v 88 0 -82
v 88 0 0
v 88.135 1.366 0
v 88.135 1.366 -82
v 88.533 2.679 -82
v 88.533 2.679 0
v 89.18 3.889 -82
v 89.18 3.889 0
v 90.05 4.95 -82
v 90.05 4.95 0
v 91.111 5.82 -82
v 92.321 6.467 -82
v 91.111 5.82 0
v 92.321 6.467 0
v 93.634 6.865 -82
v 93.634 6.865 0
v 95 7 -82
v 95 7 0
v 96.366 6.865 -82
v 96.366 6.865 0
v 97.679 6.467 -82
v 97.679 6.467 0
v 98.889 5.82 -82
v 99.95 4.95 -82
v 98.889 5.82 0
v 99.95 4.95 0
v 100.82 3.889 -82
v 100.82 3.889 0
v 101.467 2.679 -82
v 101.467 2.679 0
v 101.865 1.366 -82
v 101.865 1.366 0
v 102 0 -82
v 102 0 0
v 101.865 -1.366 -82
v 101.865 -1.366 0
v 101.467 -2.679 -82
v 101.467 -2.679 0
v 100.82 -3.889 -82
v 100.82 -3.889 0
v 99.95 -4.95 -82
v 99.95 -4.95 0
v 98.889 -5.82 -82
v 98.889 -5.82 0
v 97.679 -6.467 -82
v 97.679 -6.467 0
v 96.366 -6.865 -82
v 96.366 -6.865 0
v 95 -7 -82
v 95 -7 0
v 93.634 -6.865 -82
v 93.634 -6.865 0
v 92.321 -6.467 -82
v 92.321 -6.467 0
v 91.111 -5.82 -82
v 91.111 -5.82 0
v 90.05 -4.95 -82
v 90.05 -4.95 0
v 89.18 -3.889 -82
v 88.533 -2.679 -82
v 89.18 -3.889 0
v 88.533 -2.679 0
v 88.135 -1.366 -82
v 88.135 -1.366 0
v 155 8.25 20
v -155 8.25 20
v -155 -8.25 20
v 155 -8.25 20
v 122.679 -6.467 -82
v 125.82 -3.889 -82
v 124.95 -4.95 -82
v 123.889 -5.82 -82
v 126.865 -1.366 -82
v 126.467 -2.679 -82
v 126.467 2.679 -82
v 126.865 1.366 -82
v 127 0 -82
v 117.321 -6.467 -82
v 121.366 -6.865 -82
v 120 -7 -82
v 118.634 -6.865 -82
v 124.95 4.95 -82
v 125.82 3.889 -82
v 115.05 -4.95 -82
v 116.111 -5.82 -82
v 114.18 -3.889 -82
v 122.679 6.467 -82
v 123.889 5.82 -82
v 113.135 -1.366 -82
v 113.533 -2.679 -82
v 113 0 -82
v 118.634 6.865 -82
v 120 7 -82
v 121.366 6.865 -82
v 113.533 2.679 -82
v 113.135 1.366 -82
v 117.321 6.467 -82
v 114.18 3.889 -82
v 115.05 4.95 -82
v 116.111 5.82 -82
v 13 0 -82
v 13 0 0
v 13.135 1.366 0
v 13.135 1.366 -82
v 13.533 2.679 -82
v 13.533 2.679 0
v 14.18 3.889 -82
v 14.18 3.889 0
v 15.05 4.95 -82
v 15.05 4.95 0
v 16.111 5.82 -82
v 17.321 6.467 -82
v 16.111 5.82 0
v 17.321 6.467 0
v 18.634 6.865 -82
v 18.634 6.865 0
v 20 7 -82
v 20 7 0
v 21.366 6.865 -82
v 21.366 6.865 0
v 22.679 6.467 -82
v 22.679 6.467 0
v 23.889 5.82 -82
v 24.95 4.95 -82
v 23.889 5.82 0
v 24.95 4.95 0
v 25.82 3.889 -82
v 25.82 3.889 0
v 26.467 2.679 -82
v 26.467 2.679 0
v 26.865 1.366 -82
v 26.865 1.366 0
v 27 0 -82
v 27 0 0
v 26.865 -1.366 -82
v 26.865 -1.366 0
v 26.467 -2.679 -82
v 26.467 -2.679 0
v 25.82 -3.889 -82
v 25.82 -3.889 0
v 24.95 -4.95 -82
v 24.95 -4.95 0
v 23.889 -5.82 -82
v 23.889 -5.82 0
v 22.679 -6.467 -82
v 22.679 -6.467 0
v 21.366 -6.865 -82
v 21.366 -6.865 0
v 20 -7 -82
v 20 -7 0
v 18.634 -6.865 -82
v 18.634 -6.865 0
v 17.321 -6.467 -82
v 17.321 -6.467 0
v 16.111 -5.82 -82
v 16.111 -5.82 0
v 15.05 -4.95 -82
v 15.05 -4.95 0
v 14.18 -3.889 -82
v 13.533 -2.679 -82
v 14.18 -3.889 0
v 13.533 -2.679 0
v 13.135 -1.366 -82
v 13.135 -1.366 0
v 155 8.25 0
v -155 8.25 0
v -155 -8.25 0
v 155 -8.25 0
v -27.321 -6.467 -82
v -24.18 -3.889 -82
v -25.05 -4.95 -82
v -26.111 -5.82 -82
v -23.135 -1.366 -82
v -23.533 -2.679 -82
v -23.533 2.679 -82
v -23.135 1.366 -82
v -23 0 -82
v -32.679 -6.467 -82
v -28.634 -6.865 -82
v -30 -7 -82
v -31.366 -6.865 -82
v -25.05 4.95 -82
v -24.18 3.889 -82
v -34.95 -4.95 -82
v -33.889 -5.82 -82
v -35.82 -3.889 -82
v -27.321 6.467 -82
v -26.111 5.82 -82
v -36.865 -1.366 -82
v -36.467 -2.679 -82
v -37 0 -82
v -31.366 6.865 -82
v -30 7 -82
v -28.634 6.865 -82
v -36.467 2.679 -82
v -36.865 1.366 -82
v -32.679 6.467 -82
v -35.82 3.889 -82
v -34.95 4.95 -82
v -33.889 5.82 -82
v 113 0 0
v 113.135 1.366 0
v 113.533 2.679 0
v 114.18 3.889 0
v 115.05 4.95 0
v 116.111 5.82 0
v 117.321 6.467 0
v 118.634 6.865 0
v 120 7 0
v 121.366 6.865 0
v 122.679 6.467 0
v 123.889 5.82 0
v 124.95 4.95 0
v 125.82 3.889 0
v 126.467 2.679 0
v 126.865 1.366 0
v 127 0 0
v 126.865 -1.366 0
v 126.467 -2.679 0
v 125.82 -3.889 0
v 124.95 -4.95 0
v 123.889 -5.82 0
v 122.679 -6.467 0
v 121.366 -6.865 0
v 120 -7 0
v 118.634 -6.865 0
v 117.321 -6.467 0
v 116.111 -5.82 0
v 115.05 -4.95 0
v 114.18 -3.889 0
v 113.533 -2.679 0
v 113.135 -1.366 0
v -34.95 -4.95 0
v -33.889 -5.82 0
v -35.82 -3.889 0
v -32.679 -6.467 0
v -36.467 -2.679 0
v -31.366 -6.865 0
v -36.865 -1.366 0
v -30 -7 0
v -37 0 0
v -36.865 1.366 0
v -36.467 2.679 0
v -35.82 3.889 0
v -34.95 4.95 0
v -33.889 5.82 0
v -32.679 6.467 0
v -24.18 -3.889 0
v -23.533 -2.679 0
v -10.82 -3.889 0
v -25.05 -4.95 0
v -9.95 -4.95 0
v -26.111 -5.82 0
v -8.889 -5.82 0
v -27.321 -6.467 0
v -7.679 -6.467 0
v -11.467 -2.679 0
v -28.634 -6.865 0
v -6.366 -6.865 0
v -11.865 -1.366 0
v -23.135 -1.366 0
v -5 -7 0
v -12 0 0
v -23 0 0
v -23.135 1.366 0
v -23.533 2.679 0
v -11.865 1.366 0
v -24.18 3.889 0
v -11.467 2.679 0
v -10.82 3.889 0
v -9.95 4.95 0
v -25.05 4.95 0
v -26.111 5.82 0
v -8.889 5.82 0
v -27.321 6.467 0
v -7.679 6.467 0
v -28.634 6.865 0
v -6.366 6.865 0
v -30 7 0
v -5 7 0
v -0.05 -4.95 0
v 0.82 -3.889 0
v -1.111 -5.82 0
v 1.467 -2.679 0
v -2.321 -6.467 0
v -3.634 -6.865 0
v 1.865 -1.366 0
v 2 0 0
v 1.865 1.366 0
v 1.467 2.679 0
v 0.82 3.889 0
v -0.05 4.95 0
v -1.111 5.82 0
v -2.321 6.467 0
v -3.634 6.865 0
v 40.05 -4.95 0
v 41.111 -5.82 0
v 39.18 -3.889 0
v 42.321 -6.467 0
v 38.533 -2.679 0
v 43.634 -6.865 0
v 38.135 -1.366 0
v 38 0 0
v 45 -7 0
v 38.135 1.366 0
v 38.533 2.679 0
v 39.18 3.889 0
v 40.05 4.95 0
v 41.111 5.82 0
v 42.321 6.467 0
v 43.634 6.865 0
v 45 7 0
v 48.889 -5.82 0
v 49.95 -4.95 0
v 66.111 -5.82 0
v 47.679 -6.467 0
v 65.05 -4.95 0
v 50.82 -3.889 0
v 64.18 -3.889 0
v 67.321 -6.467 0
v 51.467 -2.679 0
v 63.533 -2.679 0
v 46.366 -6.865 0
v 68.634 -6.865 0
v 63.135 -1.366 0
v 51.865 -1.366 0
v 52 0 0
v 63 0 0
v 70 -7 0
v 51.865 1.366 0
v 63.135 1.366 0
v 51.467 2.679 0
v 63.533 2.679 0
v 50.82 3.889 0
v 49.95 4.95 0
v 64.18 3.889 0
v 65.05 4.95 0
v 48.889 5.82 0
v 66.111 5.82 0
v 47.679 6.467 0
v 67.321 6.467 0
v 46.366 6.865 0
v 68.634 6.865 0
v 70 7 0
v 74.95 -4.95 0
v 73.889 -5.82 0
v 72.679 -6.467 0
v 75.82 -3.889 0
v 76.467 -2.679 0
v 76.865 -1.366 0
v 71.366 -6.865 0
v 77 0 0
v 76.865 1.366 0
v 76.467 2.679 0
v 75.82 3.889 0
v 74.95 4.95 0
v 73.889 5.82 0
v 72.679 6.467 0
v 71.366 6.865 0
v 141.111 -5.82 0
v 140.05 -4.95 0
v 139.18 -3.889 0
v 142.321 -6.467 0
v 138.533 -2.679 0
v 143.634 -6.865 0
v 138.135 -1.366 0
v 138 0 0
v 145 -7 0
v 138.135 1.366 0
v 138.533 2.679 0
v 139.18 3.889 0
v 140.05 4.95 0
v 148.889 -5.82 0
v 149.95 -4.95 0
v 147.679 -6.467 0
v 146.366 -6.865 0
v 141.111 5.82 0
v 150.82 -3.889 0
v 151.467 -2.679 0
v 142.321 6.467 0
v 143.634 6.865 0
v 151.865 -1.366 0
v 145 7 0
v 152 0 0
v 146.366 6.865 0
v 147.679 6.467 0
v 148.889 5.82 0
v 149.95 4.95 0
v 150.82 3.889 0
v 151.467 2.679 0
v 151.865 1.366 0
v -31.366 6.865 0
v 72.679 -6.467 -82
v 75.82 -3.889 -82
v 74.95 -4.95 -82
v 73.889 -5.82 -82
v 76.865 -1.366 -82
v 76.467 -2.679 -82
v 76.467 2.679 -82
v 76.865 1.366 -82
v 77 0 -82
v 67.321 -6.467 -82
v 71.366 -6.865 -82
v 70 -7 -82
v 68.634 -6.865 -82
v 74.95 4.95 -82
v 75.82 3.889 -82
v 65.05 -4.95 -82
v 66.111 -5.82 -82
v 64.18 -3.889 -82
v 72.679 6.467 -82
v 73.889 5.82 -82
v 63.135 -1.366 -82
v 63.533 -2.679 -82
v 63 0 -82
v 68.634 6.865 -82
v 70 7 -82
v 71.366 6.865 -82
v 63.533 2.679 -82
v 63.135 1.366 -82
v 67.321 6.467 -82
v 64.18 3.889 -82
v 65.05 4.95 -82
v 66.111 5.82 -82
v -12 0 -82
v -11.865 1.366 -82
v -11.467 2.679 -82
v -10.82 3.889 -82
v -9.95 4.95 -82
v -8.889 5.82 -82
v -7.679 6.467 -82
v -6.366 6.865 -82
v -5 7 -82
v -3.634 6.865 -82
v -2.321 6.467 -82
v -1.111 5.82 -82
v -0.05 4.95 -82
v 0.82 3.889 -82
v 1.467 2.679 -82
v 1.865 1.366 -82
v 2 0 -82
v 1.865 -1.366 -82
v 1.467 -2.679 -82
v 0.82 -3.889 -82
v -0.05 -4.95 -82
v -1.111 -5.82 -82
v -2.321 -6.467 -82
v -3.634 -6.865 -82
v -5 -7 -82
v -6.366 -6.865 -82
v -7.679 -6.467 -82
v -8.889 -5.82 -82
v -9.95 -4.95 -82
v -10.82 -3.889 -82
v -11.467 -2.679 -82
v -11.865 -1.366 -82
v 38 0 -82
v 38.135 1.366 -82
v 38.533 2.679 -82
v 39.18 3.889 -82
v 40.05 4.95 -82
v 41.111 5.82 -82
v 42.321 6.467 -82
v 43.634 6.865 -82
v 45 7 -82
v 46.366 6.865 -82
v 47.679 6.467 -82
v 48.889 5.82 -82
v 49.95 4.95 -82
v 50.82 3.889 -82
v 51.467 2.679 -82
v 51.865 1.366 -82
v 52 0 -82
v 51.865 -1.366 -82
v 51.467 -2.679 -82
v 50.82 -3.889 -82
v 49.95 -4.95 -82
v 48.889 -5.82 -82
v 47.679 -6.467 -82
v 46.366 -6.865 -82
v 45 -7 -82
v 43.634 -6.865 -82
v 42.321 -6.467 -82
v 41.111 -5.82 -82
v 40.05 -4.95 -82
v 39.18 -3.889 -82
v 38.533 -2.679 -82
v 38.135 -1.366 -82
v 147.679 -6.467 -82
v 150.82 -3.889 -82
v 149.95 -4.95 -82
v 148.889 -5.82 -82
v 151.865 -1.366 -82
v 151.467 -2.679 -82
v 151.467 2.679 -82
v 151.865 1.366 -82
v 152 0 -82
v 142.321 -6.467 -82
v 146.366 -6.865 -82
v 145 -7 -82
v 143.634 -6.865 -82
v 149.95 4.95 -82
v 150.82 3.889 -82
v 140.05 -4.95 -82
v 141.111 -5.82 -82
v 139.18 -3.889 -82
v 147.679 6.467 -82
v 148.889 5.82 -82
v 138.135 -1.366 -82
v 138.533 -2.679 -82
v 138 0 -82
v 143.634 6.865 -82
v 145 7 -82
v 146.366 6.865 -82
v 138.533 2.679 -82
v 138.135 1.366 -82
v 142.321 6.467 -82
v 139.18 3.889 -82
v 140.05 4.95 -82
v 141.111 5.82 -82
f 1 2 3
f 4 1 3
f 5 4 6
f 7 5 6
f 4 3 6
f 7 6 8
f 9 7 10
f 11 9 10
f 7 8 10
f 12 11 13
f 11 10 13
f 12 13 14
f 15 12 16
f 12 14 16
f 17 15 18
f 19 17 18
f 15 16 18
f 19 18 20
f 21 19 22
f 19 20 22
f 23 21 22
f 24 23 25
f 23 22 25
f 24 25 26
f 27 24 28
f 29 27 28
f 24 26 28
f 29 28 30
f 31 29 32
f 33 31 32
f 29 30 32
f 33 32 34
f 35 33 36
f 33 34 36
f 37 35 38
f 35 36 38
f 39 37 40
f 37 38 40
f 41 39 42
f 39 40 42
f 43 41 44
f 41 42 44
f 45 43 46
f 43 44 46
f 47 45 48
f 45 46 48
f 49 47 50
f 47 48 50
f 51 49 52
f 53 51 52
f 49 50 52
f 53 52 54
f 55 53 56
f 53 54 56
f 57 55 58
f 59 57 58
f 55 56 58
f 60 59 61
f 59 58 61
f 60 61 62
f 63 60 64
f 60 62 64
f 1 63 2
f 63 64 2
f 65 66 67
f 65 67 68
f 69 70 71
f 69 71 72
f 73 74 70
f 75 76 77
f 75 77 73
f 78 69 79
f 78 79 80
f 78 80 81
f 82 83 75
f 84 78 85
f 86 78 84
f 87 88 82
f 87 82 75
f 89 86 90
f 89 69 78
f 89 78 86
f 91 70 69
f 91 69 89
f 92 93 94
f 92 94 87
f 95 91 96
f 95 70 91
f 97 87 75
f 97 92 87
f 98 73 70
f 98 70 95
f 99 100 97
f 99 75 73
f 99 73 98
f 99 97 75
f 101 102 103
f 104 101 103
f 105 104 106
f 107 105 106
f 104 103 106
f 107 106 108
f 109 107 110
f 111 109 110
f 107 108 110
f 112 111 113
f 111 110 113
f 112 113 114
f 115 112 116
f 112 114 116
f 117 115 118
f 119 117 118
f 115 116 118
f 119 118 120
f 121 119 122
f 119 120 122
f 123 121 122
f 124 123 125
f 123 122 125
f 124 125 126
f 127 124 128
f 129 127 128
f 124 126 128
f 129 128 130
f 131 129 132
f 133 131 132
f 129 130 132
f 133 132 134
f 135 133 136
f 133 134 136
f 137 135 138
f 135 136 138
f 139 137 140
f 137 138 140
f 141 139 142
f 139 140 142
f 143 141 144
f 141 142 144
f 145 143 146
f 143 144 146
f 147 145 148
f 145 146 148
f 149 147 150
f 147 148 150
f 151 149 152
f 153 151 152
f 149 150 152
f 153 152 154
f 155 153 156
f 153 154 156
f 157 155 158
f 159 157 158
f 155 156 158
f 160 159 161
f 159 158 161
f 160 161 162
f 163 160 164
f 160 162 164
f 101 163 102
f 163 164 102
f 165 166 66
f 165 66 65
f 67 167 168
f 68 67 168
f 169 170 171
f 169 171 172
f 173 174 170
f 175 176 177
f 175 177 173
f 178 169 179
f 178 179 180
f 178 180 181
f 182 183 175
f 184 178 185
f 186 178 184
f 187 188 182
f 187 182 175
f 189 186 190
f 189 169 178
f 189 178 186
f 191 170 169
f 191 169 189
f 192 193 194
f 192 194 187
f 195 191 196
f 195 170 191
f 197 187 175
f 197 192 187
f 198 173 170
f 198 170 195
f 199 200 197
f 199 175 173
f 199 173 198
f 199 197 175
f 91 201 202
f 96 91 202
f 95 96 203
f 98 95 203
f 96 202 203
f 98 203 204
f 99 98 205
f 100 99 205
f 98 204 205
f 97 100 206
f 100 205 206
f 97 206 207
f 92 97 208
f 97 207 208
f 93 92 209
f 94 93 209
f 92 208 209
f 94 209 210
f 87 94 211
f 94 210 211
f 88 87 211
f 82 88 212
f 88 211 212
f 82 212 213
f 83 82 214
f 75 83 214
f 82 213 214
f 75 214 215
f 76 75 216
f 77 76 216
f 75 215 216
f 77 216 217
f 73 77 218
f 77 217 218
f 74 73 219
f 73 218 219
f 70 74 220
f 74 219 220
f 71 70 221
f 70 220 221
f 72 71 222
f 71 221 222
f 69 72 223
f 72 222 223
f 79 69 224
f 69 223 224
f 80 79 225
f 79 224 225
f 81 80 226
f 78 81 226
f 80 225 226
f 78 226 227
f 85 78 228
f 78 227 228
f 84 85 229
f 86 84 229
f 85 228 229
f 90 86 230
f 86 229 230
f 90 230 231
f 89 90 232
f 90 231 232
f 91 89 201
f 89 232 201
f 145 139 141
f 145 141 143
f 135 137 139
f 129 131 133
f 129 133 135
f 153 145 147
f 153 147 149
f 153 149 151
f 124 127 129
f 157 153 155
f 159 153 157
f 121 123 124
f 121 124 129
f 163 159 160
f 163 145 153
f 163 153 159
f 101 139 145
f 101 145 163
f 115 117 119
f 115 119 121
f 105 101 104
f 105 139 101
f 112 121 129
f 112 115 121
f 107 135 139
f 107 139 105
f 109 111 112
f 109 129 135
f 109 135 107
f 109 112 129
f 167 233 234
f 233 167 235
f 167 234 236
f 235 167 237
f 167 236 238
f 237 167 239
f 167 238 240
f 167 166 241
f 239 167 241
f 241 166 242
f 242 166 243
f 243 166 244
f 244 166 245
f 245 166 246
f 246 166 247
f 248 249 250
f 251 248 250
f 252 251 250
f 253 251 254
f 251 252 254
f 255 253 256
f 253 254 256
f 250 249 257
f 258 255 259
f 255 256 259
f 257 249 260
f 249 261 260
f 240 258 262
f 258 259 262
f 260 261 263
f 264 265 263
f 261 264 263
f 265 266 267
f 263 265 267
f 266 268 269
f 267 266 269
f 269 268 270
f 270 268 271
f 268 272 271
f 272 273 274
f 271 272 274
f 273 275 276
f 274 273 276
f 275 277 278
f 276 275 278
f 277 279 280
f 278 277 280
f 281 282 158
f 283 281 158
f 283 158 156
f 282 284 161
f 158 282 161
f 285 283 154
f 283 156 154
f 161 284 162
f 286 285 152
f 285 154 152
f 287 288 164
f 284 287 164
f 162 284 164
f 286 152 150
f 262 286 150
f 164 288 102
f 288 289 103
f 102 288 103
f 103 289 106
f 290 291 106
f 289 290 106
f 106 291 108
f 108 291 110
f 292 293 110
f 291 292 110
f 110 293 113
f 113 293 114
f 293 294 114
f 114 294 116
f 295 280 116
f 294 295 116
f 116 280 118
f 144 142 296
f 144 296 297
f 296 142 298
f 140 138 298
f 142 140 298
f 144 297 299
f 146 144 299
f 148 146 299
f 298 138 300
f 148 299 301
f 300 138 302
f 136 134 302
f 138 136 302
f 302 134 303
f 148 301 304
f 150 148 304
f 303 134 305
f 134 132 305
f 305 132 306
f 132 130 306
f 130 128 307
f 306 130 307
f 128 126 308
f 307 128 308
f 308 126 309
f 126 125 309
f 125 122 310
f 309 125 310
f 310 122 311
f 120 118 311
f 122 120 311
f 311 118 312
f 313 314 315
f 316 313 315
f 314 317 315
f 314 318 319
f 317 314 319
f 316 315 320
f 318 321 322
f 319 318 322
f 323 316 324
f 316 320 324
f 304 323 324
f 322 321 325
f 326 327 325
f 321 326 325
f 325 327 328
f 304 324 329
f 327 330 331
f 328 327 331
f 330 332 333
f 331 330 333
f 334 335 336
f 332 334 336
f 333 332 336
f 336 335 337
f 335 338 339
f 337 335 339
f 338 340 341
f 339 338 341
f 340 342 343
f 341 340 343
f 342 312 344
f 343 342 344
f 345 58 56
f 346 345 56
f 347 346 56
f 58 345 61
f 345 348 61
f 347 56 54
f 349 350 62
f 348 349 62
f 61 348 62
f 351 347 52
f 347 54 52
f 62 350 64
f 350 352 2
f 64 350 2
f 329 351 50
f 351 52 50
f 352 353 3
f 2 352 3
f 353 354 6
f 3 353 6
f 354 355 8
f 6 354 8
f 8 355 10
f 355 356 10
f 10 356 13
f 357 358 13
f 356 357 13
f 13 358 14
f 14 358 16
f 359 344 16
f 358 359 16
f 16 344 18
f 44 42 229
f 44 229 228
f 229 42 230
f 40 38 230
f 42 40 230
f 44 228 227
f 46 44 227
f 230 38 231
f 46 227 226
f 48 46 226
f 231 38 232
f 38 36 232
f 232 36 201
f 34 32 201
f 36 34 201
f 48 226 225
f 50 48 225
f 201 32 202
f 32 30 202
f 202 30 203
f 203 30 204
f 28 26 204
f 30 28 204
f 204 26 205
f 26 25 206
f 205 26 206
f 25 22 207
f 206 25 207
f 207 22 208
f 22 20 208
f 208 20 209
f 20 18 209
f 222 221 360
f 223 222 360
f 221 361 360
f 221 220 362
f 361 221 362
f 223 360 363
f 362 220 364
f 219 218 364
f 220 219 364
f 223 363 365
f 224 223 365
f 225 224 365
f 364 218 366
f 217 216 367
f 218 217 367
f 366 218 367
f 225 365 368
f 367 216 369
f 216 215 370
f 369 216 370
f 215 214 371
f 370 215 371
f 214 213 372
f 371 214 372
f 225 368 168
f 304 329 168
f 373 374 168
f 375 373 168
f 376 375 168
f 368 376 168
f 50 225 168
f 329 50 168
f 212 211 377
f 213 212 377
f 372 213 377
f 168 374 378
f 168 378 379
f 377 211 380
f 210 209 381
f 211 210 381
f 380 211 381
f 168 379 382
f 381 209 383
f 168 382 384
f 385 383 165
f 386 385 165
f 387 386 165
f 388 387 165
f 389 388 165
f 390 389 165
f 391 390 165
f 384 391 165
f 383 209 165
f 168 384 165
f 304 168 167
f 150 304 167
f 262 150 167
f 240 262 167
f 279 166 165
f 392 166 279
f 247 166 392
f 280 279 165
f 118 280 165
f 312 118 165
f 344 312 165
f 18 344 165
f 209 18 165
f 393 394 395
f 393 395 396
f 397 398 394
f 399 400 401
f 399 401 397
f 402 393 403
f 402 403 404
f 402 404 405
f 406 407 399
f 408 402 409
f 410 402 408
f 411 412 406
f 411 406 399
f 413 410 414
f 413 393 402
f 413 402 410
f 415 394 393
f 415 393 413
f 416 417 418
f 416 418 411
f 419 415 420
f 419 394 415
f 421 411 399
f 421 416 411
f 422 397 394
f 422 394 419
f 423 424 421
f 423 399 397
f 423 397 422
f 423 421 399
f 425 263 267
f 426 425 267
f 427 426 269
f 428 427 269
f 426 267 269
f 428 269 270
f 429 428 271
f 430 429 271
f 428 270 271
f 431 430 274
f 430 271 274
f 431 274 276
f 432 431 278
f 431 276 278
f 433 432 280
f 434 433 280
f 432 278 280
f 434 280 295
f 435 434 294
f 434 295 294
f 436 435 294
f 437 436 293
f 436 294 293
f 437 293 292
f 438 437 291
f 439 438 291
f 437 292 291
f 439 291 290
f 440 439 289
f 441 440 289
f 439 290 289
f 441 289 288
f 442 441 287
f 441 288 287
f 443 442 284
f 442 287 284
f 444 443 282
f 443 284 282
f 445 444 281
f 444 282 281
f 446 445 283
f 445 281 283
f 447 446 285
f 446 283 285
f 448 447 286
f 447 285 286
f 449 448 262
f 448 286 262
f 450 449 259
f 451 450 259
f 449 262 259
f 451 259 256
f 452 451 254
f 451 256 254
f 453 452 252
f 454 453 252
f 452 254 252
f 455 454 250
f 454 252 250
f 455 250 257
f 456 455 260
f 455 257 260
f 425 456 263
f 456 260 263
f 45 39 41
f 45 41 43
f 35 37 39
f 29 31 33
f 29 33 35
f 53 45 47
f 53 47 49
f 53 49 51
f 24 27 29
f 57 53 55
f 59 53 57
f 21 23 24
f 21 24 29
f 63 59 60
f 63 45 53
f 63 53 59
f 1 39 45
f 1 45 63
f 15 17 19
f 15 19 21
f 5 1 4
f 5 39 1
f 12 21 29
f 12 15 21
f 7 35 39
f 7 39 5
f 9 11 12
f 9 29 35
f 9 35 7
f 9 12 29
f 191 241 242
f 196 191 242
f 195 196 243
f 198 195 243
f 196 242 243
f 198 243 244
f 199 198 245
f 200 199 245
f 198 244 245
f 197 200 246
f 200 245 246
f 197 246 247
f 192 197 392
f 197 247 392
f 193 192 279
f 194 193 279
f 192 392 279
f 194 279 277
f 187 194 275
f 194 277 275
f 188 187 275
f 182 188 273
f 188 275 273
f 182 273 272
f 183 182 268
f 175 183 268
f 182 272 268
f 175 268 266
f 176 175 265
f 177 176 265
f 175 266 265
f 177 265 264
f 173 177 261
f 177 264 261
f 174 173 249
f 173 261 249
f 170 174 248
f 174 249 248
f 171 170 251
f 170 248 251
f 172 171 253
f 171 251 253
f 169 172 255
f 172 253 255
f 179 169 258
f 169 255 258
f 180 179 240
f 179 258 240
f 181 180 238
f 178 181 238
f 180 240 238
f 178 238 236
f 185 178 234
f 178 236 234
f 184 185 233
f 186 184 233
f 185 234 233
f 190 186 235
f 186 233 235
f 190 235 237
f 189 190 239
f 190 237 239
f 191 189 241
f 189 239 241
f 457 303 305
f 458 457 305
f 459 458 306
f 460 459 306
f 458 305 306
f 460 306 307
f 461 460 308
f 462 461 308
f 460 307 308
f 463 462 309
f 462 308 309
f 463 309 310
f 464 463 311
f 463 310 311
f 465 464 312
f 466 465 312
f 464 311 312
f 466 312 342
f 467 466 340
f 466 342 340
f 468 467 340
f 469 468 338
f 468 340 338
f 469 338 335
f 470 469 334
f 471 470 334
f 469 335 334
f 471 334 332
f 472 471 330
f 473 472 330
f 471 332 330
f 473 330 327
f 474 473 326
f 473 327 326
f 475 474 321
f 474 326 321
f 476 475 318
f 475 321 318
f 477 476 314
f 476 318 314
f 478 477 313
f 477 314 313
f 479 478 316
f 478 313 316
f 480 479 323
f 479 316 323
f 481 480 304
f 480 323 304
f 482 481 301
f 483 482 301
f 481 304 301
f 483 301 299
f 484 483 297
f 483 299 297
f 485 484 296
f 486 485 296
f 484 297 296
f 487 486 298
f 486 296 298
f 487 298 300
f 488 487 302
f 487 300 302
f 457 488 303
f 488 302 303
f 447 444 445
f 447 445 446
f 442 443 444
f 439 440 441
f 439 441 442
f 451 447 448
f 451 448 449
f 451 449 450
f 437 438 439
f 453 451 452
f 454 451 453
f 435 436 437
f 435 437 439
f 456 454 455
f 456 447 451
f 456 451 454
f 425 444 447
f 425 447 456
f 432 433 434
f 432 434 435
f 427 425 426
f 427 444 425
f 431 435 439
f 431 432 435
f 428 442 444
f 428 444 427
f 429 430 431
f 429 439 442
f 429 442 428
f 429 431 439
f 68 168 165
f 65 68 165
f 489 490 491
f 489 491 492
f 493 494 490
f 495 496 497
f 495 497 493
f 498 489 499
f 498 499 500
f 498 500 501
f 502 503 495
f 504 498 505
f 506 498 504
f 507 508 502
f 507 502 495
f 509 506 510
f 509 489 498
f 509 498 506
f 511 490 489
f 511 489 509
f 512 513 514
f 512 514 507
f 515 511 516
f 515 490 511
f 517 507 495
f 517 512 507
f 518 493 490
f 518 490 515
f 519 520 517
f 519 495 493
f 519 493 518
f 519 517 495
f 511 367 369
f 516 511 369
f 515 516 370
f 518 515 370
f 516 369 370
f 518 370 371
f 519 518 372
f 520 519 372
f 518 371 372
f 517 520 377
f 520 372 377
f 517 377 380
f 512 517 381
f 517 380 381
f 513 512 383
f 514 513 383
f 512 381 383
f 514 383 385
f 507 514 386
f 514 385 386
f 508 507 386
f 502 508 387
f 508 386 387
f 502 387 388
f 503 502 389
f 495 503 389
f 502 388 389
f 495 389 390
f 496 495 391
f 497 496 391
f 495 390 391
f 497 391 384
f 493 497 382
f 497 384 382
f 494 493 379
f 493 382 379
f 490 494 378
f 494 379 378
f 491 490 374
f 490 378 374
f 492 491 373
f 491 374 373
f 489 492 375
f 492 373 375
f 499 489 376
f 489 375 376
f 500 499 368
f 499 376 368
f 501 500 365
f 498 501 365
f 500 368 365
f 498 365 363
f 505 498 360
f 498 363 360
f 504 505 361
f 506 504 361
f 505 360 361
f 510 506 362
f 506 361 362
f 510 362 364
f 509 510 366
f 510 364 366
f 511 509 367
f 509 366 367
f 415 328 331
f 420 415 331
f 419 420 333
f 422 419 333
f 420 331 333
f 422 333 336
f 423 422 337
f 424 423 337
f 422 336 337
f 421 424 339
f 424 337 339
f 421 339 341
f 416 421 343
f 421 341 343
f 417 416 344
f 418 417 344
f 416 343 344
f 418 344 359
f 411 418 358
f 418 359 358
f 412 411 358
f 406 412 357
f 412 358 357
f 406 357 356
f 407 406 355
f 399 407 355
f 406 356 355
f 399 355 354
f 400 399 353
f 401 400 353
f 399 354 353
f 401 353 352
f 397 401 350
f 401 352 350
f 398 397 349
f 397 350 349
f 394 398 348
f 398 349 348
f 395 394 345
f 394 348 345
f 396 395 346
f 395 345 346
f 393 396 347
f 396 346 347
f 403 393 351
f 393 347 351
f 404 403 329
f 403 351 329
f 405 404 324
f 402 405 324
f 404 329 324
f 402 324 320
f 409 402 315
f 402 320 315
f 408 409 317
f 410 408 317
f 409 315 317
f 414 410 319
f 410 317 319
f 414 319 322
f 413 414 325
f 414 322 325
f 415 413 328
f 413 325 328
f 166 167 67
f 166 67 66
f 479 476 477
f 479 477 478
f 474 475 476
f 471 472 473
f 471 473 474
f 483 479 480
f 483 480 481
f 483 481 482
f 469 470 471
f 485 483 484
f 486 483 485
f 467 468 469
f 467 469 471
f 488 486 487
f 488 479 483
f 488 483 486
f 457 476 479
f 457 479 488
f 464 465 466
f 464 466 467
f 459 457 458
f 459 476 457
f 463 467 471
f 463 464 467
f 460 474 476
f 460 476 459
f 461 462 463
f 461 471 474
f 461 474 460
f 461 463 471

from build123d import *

# Parameters (mm, degrees)
SKETCH2_W           = 310
SKETCH2_H           = 16.5
BOSS_EXTRUDE1_DEPTH = 20
SKETCH3_R           = 7
BOSS_EXTRUDE2_DEPTH = 82
LPATTERN1_COUNT     = 8
LPATTERN1_PITCH     = 25


with BuildPart() as part:
    # Sketch2 → Boss-Extrude1 (new body)
    with BuildSketch(Plane.XY):
        Rectangle(SKETCH2_W, SKETCH2_H)
    extrude(amount=BOSS_EXTRUDE1_DEPTH)

    # Sketch3 → Boss-Extrude2 (add)
    with BuildSketch(Plane(origin=(0, 0, 0), x_dir=(-1, 0, 0), z_dir=(0, 0, -1))):
        with Locations((-145, 0)):
            Circle(SKETCH3_R)
    boss_extrude2 = extrude(amount=BOSS_EXTRUDE2_DEPTH)

    # LPattern1: Boss-Extrude2 ×8
    with Locations(*[(-i * LPATTERN1_PITCH, 0, 0) for i in range(1, LPATTERN1_COUNT)]):
        add(boss_extrude2)


solid = part.part
